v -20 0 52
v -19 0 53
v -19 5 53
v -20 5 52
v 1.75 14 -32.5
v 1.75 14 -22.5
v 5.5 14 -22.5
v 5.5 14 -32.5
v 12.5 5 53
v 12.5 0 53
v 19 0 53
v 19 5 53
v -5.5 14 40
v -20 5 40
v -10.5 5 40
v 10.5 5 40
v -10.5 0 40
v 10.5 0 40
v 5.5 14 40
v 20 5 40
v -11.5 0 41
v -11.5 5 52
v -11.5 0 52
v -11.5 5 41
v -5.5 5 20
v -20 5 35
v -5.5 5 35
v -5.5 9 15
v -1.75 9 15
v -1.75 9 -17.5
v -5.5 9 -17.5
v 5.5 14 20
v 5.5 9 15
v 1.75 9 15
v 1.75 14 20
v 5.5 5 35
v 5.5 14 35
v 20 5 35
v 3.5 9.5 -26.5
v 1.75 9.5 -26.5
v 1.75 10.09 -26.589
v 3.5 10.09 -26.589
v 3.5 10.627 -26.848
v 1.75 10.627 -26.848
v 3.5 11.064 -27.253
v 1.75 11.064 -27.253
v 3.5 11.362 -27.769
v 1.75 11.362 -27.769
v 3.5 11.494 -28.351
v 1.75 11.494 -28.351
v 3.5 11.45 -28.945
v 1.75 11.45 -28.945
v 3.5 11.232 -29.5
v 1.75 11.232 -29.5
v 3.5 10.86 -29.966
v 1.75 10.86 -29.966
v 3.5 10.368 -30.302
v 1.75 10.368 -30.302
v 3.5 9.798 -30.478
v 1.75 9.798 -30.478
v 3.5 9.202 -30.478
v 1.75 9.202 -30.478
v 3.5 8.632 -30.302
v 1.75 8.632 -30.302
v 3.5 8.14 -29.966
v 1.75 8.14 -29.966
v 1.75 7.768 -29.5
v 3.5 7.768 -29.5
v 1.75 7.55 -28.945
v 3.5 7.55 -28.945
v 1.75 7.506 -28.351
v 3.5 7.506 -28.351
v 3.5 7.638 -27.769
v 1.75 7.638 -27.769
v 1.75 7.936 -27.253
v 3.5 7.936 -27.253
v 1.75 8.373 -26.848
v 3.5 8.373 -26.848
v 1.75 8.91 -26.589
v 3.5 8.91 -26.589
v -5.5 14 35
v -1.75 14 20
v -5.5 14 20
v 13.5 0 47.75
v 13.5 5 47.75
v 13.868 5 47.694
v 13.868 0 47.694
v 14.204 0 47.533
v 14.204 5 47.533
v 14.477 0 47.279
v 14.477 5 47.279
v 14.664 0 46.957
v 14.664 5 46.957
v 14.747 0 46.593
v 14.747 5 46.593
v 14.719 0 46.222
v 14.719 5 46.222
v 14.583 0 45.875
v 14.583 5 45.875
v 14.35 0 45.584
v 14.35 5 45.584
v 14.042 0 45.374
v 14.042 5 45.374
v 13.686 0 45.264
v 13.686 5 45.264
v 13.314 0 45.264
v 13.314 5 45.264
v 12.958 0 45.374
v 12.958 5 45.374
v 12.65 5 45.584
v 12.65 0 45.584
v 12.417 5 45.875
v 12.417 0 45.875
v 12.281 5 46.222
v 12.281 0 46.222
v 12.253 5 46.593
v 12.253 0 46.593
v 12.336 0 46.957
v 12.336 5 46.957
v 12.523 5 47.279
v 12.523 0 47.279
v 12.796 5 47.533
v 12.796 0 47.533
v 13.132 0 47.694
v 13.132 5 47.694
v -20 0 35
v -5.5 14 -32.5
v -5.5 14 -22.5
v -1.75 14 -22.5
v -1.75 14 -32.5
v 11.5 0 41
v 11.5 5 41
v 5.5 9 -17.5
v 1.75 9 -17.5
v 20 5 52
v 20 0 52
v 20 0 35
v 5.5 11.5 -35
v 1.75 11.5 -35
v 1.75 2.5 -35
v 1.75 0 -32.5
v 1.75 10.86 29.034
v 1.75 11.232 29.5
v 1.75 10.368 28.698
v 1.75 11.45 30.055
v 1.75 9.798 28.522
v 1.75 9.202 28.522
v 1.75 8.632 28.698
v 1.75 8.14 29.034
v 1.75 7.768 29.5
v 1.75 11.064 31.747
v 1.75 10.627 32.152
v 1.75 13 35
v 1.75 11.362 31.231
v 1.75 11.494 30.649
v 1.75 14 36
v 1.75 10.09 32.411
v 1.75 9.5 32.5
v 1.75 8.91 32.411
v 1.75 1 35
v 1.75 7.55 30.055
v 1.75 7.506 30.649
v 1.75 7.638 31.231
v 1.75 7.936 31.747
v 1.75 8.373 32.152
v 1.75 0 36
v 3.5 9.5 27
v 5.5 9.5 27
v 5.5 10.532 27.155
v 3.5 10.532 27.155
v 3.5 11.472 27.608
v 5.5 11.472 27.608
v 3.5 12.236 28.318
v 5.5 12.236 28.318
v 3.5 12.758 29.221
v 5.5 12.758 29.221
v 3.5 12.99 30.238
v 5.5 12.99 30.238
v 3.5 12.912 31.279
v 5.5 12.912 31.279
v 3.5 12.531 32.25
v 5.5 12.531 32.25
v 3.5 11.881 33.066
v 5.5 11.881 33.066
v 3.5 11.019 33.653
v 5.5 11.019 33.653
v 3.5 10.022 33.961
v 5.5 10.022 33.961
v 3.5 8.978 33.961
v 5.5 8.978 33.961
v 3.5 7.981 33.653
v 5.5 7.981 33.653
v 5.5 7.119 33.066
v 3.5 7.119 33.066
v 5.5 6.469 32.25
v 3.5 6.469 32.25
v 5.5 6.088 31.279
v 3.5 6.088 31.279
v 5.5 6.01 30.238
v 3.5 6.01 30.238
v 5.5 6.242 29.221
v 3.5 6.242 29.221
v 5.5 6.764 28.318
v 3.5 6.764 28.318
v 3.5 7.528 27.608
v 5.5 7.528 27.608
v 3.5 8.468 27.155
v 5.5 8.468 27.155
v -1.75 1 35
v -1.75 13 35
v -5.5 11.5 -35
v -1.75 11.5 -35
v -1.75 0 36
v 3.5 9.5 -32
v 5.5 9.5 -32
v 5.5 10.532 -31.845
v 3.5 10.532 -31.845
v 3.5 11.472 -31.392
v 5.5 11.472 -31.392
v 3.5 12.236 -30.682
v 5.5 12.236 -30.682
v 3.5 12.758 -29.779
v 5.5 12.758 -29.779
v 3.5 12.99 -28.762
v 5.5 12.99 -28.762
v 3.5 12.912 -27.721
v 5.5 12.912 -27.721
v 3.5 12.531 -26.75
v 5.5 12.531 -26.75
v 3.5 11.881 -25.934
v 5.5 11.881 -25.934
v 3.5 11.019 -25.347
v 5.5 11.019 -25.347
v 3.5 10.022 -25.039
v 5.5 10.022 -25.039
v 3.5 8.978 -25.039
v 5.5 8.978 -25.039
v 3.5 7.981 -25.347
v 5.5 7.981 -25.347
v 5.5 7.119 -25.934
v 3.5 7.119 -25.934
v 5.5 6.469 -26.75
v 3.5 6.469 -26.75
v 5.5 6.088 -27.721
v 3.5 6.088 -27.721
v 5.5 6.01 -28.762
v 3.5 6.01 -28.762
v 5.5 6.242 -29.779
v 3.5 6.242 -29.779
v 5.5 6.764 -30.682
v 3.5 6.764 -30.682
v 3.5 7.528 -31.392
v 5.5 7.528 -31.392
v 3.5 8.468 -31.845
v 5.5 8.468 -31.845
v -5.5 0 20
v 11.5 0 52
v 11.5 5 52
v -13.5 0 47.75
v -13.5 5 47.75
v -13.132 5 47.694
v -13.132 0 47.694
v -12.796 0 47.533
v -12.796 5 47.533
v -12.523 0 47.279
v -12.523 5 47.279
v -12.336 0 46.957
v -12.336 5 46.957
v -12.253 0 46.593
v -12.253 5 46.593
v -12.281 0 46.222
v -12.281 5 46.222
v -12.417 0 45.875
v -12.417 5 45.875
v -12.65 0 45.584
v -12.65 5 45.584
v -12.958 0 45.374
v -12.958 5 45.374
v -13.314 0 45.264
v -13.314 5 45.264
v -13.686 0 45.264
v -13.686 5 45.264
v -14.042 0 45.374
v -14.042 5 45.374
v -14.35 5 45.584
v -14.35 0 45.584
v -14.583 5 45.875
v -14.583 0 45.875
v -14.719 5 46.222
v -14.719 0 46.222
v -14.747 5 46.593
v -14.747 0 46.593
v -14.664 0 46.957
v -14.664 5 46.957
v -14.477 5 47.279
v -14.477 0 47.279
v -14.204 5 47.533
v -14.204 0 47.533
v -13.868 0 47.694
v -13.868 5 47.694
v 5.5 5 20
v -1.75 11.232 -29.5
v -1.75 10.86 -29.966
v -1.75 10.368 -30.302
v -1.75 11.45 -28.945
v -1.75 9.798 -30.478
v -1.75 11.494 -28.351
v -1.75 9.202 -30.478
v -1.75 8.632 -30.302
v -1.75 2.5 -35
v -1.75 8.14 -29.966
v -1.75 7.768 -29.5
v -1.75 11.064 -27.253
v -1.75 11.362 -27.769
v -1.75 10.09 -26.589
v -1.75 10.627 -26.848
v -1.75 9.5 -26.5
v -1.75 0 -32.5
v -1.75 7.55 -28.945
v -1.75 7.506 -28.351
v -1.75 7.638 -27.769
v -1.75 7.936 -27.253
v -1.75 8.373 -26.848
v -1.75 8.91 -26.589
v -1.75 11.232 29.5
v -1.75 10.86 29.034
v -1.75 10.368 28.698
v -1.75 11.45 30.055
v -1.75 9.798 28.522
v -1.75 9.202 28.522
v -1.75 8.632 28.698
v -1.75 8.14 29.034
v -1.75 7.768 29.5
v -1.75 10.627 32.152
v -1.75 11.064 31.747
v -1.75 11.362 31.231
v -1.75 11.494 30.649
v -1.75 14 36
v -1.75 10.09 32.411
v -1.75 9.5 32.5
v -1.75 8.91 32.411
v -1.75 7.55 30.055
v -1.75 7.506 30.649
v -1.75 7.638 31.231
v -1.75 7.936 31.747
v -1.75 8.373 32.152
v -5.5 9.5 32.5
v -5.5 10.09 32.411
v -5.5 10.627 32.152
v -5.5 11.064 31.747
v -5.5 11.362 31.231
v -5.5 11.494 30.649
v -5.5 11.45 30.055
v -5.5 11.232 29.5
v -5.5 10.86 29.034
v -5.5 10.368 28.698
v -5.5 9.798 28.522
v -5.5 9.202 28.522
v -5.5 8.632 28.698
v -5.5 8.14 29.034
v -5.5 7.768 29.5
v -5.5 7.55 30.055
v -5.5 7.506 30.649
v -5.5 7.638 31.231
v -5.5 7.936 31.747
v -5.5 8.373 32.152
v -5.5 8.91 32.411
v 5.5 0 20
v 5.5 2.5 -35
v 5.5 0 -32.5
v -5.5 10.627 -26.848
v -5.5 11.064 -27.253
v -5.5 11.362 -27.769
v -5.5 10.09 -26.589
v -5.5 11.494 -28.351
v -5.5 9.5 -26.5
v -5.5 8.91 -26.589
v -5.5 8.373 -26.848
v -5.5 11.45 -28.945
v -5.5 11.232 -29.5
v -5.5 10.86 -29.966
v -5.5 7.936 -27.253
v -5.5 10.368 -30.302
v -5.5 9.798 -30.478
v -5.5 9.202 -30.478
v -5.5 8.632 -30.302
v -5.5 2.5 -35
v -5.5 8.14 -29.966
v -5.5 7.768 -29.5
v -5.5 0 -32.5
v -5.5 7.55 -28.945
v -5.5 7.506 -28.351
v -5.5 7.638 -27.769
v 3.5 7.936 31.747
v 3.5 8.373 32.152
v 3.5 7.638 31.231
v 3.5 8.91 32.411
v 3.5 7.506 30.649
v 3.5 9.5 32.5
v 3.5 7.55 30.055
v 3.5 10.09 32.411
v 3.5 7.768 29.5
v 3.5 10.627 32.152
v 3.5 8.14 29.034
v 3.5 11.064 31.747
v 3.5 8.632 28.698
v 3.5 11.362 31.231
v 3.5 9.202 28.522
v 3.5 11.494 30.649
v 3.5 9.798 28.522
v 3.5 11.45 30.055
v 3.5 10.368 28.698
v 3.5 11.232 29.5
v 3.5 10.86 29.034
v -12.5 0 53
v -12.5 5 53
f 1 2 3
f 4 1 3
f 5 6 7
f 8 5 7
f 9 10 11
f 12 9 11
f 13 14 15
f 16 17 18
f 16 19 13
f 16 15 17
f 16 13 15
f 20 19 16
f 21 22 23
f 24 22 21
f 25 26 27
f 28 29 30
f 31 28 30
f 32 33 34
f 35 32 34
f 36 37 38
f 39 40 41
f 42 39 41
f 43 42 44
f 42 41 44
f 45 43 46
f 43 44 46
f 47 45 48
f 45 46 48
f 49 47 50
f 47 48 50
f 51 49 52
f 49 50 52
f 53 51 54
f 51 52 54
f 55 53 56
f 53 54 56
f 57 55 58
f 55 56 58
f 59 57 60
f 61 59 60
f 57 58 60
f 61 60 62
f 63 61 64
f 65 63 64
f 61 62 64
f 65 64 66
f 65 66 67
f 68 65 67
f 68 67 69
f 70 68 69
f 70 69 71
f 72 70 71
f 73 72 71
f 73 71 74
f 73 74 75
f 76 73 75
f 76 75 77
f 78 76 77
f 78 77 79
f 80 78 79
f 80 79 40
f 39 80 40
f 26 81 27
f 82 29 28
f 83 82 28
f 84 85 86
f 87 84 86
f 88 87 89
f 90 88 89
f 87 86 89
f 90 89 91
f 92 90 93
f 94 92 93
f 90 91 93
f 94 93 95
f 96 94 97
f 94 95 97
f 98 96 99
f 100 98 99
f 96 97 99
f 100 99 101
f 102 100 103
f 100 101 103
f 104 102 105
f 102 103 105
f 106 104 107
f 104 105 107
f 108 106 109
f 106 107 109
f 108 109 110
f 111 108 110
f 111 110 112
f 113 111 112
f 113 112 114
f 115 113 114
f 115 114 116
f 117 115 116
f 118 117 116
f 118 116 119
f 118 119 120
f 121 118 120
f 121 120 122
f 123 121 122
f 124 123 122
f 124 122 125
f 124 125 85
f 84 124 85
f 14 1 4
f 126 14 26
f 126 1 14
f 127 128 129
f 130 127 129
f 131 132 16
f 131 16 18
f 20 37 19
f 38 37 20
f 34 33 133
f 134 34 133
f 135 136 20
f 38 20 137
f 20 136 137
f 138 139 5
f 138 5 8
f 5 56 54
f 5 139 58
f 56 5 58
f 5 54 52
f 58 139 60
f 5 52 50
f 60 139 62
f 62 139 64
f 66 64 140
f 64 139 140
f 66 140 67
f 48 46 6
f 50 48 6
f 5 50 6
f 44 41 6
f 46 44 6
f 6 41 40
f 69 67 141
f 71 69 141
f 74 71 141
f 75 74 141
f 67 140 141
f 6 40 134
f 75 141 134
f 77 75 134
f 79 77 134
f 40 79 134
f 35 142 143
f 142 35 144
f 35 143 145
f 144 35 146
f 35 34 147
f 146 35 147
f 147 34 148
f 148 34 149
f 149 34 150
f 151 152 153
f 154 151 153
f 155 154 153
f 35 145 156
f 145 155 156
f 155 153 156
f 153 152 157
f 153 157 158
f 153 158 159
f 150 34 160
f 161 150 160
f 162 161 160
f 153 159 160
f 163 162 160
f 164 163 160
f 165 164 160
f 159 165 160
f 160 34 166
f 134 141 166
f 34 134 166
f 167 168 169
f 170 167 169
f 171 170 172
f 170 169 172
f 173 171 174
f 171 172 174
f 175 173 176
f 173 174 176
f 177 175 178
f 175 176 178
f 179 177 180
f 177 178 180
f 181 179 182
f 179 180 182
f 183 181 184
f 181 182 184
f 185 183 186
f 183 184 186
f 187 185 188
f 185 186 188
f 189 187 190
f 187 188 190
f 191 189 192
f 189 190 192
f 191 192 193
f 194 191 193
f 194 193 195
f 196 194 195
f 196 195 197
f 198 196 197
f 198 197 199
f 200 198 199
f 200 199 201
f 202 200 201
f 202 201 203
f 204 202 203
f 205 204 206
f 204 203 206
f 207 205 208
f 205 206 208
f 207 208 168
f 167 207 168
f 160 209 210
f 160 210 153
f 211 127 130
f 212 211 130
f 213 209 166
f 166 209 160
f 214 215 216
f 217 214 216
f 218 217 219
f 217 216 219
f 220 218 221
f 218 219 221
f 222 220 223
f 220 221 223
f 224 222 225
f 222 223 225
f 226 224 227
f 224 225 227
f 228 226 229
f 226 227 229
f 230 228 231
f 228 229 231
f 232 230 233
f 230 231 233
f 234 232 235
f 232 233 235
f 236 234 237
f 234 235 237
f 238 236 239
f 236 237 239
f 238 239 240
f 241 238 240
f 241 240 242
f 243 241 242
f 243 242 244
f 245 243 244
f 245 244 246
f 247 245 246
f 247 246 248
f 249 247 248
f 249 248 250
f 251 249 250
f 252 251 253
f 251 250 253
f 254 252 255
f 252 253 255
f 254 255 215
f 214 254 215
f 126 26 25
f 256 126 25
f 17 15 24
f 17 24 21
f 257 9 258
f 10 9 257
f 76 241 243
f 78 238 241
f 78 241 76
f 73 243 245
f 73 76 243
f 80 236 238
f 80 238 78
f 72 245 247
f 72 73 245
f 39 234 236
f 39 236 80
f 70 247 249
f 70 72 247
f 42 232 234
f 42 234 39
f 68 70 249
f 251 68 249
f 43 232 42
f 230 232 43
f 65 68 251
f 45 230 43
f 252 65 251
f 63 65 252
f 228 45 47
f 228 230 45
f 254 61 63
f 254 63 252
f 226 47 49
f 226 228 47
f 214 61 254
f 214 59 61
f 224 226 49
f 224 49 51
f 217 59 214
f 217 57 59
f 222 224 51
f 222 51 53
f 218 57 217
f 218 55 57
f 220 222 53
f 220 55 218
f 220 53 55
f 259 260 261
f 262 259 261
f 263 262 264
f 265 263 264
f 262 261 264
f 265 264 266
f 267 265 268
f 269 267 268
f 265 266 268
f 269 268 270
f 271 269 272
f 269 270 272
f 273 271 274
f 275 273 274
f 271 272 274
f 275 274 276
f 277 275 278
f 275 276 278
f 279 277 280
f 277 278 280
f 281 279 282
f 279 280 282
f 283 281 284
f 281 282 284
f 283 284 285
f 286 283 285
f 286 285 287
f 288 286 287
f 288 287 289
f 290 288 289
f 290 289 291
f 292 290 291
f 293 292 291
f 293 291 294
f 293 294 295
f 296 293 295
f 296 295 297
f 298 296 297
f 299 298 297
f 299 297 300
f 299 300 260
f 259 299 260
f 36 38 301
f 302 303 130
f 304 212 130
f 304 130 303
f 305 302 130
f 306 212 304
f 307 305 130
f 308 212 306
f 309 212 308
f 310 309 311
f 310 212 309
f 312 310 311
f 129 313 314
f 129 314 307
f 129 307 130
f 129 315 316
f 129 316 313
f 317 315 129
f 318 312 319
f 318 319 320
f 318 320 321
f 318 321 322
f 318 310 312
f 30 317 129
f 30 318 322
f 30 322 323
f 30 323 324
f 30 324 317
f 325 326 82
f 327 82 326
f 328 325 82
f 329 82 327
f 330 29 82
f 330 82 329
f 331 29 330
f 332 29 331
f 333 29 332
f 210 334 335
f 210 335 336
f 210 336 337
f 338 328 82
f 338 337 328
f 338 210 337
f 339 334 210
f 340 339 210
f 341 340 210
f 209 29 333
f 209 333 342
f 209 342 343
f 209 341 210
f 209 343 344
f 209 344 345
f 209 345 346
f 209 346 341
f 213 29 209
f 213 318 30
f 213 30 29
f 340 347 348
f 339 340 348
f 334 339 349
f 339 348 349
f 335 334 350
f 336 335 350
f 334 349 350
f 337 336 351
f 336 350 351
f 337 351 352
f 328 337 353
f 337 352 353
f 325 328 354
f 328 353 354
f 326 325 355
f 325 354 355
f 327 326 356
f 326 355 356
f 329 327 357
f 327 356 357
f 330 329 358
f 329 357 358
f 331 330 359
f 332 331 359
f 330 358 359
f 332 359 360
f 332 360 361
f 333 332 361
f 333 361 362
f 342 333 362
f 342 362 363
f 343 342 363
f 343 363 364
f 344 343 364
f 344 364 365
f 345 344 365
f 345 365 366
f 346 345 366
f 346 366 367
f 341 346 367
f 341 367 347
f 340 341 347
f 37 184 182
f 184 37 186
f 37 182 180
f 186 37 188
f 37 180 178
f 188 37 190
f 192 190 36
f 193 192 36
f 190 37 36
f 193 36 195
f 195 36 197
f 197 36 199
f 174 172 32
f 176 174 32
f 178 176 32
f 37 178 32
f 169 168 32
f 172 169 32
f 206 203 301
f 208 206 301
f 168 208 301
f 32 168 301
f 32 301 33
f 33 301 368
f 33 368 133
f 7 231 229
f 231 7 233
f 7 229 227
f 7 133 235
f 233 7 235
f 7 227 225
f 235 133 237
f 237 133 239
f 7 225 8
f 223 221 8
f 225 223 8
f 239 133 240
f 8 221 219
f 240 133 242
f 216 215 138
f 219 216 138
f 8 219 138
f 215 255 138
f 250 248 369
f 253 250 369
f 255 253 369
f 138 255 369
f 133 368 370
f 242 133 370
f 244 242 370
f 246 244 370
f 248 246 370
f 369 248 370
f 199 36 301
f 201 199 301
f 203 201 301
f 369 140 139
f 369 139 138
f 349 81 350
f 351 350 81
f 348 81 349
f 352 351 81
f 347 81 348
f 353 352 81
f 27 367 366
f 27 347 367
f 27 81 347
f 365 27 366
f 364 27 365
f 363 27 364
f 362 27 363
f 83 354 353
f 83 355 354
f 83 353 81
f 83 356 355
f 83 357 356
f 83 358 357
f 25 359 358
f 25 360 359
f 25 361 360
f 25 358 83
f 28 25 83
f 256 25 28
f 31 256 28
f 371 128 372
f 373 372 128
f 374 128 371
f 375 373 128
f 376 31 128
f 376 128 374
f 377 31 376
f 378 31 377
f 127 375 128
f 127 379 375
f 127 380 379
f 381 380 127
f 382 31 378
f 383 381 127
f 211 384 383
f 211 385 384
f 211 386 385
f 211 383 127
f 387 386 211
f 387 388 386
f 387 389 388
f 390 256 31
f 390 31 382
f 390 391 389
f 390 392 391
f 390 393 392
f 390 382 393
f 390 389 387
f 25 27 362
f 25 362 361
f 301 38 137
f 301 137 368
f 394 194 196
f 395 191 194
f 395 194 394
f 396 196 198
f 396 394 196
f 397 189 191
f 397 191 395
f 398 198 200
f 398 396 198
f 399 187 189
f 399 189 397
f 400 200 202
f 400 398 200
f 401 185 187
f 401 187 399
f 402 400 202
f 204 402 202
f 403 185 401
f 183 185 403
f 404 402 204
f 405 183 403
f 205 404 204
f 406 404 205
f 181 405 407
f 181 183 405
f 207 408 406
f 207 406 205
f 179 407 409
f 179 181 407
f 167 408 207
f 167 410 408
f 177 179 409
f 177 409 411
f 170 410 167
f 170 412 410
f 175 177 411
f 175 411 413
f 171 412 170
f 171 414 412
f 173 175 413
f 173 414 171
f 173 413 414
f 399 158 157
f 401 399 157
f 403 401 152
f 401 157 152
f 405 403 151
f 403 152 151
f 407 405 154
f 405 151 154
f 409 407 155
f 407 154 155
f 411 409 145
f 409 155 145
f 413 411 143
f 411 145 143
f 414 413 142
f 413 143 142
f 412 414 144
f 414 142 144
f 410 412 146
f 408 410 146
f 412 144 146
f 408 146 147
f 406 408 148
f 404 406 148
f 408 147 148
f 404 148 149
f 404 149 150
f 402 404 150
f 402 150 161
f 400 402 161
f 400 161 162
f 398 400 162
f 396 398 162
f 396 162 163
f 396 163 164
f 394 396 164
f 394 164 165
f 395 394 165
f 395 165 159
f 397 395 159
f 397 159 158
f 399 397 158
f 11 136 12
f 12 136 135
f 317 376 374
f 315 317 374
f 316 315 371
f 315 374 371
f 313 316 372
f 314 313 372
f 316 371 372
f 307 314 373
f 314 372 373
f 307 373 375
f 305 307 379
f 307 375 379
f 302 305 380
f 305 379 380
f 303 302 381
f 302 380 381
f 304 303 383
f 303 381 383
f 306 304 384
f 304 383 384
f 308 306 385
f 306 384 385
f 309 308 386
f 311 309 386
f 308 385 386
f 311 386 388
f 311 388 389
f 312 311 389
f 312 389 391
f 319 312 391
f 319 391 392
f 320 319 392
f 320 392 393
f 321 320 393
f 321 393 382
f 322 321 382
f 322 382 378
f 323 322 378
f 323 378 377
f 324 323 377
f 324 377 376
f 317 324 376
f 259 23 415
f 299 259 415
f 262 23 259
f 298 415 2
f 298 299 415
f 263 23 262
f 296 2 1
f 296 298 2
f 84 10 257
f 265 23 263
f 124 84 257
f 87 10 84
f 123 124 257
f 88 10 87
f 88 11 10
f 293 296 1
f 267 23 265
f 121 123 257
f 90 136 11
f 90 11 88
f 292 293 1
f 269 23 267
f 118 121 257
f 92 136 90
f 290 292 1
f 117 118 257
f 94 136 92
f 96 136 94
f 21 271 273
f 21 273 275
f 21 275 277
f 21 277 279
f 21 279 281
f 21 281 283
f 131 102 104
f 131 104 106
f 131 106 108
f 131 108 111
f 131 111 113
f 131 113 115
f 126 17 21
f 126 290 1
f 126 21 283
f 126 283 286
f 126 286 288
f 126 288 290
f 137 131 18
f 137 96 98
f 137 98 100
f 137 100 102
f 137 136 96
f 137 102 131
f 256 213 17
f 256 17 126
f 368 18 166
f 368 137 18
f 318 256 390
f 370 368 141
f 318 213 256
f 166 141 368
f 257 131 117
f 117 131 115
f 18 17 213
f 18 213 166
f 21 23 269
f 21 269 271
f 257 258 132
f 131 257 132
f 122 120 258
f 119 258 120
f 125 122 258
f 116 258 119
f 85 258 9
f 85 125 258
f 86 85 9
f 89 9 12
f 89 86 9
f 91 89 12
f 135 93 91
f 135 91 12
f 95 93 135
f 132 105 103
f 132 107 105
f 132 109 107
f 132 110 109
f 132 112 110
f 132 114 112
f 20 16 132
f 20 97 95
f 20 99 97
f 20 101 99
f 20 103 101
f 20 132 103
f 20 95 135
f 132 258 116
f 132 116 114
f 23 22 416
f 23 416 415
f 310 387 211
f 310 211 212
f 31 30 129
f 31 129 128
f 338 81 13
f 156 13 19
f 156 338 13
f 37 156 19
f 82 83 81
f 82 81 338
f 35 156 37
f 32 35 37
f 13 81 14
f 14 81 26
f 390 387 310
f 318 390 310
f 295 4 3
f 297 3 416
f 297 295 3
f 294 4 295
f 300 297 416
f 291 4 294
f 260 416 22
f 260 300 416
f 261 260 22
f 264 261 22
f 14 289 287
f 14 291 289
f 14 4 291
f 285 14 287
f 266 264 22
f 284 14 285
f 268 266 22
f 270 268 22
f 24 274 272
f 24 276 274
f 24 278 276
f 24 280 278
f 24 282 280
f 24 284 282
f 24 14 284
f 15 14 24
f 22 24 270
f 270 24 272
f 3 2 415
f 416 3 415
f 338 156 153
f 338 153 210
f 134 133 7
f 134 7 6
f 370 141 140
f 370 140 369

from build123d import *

# Parameters (mm, degrees)
SKETCH1_W           = 11
SKETCH1_H           = 70
SKETCH1_W_2         = 40
SKETCH1_H_2         = 18
BOSS_EXTRUDE1_DEPTH = 5
SKETCH3_W           = 23
SKETCH3_H           = 13
CUT_EXTRUDE2_DEPTH  = 57.868268832
SKETCH4_R           = 1.25
CUT_EXTRUDE3_DEPTH  = 57.868268832
SKETCH5_W           = 11
SKETCH5_H           = 75
BOSS_EXTRUDE2_DEPTH = 9
SKETCH6_W           = 3.5
SKETCH6_H           = 70
CUT_EXTRUDE4_DEPTH  = 59.352377844
SKETCH7_R           = 2
CUT_EXTRUDE5_DEPTH  = 61.458663564
RIB2_REACH          = 80.873
SKETCH8_WALL_W      = 176.81268046
SKETCH8_WALL_H      = 5
RIB4_REACH          = 80.873
SKETCH9_WALL_W      = 176.81268046
SKETCH9_WALL_H      = 5
RIB8_REACH          = 60.352
SKETCH10_WALL_W     = 139.567401732
SKETCH10_WALL_H     = 5
SKETCH14_W          = 42.5
SKETCH14_H          = 5
CUT_EXTRUDE6_DEPTH  = 61.458663564
CHAMFER9_SIZE       = 5
CHAMFER10_SIZE      = 2.5
CHAMFER11_SIZE      = 1
CHAMFER12_SIZE      = 1
SKETCH15_R          = 3.5
CUT_EXTRUDE7_DEPTH  = 2
CHAMFER14_SIZE      = 1


with BuildPart() as part:
    # Sketch1 → Boss-Extrude1 (new body)
    with BuildSketch(Plane(origin=(0, 0, 0), x_dir=(1, 0, 0), z_dir=(0, 1, 0))):
        Rectangle(SKETCH1_W, SKETCH1_H)
        with Locations((0, -44)):
            Rectangle(SKETCH1_W_2, SKETCH1_H_2)
    extrude(amount=BOSS_EXTRUDE1_DEPTH)

    # Sketch3 → Cut-Extrude2 (cut, through all)
    with BuildSketch(Plane(origin=(0, 5, 0), x_dir=(1, 0, 0), z_dir=(0, 1, 0))):
        with Locations((0, -46.5)):
            Rectangle(SKETCH3_W, SKETCH3_H)
    extrude(amount=-CUT_EXTRUDE2_DEPTH, mode=Mode.SUBTRACT)

    # Sketch4 → Cut-Extrude3 (cut, through all)
    with BuildSketch(Plane(origin=(0, 5, 0), x_dir=(1, 0, 0), z_dir=(0, 1, 0))):
        with Locations(Location((-13.5, -46.5, 0), (0, 0, 270))):
            Circle(SKETCH4_R)
        with Locations(Location((13.5, -46.5, 0), (0, 0, 270))):
            Circle(SKETCH4_R)
    extrude(amount=-CUT_EXTRUDE3_DEPTH, mode=Mode.SUBTRACT)

    # Sketch5 → Boss-Extrude2 (add)
    with BuildSketch(Plane(origin=(0, 5, 0), x_dir=(1, 0, 0), z_dir=(0, 1, 0))):
        with Locations((0, -2.5)):
            Rectangle(SKETCH5_W, SKETCH5_H)
    extrude(amount=BOSS_EXTRUDE2_DEPTH)

    # Sketch6 → Cut-Extrude4 (cut, through all)
    with BuildSketch(Plane.XZ):
        Rectangle(SKETCH6_W, SKETCH6_H)
    extrude(amount=-CUT_EXTRUDE4_DEPTH, mode=Mode.SUBTRACT)

    # Sketch7 → Cut-Extrude5 (cut, through all)
    with BuildSketch(Plane.ZY.offset(5.5)):
        with Locations((-28.5, 9.5)):
            Circle(SKETCH7_R)
        with Locations((30.5, 9.5)):
            Circle(SKETCH7_R)
    extrude(amount=-CUT_EXTRUDE5_DEPTH, mode=Mode.SUBTRACT)

    # Sketch8 wall → Rib2 (add, up to next)
    with BuildSketch(Plane(origin=(-12.75, 9.5, 40), x_dir=(-0.849640166198, -0.527362861778, 0), z_dir=(0.527362861778, -0.849640166198, 0)), mode=Mode.PRIVATE) as rib2_sk1:
        with Locations((0, 2.5)):
            Rectangle(SKETCH8_WALL_W, SKETCH8_WALL_H)
    rib2_tool1 = extrude(rib2_sk1.sketch, amount=RIB2_REACH, mode=Mode.PRIVATE) - part.part
    add(rib2_tool1.solids().sort_by_distance((-12.75, 9.5, 40))[0])

    # Sketch9 wall → Rib4 (add, up to next)
    with BuildSketch(Plane(origin=(12.75, 9.5, 40), x_dir=(0.849640166198, -0.527362861778, 0), z_dir=(0.527362861778, 0.849640166198, 0)), mode=Mode.PRIVATE) as rib4_sk1:
        with Locations((0, 2.5)):
            Rectangle(SKETCH9_WALL_W, SKETCH9_WALL_H)
    rib4_tool1 = extrude(rib4_sk1.sketch, amount=-RIB4_REACH, mode=Mode.PRIVATE) - part.part
    add(rib4_tool1.solids().sort_by_distance((12.75, 9.5, 40))[0])

    # Sketch10 wall → Rib8 (add, up to next)
    with BuildSketch(Plane(origin=(-12.75, 0, 27.5), x_dir=(0.695022096847, 0, -0.718988376049), z_dir=(0.718988376049, 0, 0.695022096847)), mode=Mode.PRIVATE) as rib8_sk1:
        with Locations((0, 2.5)):
            Rectangle(SKETCH10_WALL_W, SKETCH10_WALL_H)
    rib8_tool1 = extrude(rib8_sk1.sketch, amount=RIB8_REACH, mode=Mode.PRIVATE) - part.part
    rib8 = rib8_tool1.solids().sort_by_distance((-12.75, 0, 27.5))[0]
    add(rib8)

    # Mirror1: Rib8 across plane
    add(rib8.mirror(Plane(origin=(0, 0, 0), x_dir=(0, 0, 1), z_dir=(1, 0, 0))))

    # Sketch14 → Cut-Extrude6 (cut, through all)
    with BuildSketch(Plane(origin=(5.5, 0, 0), x_dir=(0, 0, -1), z_dir=(1, 0, 0))):
        with Locations((1.25, 11.5)):
            Rectangle(SKETCH14_W, SKETCH14_H)
    extrude(amount=-CUT_EXTRUDE6_DEPTH, mode=Mode.SUBTRACT)

    # Chamfer9
    chamfer9_edges = [part.edges().sort_by_distance(p)[0] for p in [
        (3.625, 9, -22.5),
        (-3.625, 9, -22.5),
        (3.625, 9, 20),
        (-3.625, 9, 20),
    ]]
    chamfer(chamfer9_edges, length=CHAMFER9_SIZE - 0.0001)  # a hair under: the kernel refuses the full size

    # Chamfer10
    chamfer10_edges = [part.edges().sort_by_distance(p)[0] for p in [
        (-3.625, 0, -35),
        (3.625, 14, -35),
        (-3.625, 14, -35),
        (3.625, 0, -35),
    ]]
    chamfer(chamfer10_edges, length=CHAMFER10_SIZE)

    # Chamfer11
    chamfer11_edges = [part.edges().sort_by_distance(p)[0] for p in [
        (-11.5, 2.5, 53),
        (11.5, 2.5, 53),
        (-20, 2.5, 53),
        (20, 2.5, 53),
    ]]
    chamfer(chamfer11_edges, length=CHAMFER11_SIZE)

    # Chamfer12
    chamfer12_edges = [part.edges().sort_by_distance(p)[0] for p in [
        (-11.5, 2.5, 40),
        (11.5, 2.5, 40),
    ]]
    chamfer(chamfer12_edges, length=CHAMFER12_SIZE)

    # Sketch15 → Cut-Extrude7 (cut)
    with BuildSketch(Plane(origin=(5.5, 0, 0), x_dir=(0, 0, -1), z_dir=(1, 0, 0))):
        with Locations((28.5, 9.5)):
            Circle(SKETCH15_R)
        with Locations((-30.5, 9.5)):
            Circle(SKETCH15_R)
    extrude(amount=-CUT_EXTRUDE7_DEPTH, mode=Mode.SUBTRACT)

    # Chamfer14
    chamfer14_edges = [part.edges().sort_by_distance(p)[0] for p in [
        (0, 14, 35),
        (0, 0, 35),
    ]]
    chamfer(chamfer14_edges, length=CHAMFER14_SIZE)


solid = part.part
